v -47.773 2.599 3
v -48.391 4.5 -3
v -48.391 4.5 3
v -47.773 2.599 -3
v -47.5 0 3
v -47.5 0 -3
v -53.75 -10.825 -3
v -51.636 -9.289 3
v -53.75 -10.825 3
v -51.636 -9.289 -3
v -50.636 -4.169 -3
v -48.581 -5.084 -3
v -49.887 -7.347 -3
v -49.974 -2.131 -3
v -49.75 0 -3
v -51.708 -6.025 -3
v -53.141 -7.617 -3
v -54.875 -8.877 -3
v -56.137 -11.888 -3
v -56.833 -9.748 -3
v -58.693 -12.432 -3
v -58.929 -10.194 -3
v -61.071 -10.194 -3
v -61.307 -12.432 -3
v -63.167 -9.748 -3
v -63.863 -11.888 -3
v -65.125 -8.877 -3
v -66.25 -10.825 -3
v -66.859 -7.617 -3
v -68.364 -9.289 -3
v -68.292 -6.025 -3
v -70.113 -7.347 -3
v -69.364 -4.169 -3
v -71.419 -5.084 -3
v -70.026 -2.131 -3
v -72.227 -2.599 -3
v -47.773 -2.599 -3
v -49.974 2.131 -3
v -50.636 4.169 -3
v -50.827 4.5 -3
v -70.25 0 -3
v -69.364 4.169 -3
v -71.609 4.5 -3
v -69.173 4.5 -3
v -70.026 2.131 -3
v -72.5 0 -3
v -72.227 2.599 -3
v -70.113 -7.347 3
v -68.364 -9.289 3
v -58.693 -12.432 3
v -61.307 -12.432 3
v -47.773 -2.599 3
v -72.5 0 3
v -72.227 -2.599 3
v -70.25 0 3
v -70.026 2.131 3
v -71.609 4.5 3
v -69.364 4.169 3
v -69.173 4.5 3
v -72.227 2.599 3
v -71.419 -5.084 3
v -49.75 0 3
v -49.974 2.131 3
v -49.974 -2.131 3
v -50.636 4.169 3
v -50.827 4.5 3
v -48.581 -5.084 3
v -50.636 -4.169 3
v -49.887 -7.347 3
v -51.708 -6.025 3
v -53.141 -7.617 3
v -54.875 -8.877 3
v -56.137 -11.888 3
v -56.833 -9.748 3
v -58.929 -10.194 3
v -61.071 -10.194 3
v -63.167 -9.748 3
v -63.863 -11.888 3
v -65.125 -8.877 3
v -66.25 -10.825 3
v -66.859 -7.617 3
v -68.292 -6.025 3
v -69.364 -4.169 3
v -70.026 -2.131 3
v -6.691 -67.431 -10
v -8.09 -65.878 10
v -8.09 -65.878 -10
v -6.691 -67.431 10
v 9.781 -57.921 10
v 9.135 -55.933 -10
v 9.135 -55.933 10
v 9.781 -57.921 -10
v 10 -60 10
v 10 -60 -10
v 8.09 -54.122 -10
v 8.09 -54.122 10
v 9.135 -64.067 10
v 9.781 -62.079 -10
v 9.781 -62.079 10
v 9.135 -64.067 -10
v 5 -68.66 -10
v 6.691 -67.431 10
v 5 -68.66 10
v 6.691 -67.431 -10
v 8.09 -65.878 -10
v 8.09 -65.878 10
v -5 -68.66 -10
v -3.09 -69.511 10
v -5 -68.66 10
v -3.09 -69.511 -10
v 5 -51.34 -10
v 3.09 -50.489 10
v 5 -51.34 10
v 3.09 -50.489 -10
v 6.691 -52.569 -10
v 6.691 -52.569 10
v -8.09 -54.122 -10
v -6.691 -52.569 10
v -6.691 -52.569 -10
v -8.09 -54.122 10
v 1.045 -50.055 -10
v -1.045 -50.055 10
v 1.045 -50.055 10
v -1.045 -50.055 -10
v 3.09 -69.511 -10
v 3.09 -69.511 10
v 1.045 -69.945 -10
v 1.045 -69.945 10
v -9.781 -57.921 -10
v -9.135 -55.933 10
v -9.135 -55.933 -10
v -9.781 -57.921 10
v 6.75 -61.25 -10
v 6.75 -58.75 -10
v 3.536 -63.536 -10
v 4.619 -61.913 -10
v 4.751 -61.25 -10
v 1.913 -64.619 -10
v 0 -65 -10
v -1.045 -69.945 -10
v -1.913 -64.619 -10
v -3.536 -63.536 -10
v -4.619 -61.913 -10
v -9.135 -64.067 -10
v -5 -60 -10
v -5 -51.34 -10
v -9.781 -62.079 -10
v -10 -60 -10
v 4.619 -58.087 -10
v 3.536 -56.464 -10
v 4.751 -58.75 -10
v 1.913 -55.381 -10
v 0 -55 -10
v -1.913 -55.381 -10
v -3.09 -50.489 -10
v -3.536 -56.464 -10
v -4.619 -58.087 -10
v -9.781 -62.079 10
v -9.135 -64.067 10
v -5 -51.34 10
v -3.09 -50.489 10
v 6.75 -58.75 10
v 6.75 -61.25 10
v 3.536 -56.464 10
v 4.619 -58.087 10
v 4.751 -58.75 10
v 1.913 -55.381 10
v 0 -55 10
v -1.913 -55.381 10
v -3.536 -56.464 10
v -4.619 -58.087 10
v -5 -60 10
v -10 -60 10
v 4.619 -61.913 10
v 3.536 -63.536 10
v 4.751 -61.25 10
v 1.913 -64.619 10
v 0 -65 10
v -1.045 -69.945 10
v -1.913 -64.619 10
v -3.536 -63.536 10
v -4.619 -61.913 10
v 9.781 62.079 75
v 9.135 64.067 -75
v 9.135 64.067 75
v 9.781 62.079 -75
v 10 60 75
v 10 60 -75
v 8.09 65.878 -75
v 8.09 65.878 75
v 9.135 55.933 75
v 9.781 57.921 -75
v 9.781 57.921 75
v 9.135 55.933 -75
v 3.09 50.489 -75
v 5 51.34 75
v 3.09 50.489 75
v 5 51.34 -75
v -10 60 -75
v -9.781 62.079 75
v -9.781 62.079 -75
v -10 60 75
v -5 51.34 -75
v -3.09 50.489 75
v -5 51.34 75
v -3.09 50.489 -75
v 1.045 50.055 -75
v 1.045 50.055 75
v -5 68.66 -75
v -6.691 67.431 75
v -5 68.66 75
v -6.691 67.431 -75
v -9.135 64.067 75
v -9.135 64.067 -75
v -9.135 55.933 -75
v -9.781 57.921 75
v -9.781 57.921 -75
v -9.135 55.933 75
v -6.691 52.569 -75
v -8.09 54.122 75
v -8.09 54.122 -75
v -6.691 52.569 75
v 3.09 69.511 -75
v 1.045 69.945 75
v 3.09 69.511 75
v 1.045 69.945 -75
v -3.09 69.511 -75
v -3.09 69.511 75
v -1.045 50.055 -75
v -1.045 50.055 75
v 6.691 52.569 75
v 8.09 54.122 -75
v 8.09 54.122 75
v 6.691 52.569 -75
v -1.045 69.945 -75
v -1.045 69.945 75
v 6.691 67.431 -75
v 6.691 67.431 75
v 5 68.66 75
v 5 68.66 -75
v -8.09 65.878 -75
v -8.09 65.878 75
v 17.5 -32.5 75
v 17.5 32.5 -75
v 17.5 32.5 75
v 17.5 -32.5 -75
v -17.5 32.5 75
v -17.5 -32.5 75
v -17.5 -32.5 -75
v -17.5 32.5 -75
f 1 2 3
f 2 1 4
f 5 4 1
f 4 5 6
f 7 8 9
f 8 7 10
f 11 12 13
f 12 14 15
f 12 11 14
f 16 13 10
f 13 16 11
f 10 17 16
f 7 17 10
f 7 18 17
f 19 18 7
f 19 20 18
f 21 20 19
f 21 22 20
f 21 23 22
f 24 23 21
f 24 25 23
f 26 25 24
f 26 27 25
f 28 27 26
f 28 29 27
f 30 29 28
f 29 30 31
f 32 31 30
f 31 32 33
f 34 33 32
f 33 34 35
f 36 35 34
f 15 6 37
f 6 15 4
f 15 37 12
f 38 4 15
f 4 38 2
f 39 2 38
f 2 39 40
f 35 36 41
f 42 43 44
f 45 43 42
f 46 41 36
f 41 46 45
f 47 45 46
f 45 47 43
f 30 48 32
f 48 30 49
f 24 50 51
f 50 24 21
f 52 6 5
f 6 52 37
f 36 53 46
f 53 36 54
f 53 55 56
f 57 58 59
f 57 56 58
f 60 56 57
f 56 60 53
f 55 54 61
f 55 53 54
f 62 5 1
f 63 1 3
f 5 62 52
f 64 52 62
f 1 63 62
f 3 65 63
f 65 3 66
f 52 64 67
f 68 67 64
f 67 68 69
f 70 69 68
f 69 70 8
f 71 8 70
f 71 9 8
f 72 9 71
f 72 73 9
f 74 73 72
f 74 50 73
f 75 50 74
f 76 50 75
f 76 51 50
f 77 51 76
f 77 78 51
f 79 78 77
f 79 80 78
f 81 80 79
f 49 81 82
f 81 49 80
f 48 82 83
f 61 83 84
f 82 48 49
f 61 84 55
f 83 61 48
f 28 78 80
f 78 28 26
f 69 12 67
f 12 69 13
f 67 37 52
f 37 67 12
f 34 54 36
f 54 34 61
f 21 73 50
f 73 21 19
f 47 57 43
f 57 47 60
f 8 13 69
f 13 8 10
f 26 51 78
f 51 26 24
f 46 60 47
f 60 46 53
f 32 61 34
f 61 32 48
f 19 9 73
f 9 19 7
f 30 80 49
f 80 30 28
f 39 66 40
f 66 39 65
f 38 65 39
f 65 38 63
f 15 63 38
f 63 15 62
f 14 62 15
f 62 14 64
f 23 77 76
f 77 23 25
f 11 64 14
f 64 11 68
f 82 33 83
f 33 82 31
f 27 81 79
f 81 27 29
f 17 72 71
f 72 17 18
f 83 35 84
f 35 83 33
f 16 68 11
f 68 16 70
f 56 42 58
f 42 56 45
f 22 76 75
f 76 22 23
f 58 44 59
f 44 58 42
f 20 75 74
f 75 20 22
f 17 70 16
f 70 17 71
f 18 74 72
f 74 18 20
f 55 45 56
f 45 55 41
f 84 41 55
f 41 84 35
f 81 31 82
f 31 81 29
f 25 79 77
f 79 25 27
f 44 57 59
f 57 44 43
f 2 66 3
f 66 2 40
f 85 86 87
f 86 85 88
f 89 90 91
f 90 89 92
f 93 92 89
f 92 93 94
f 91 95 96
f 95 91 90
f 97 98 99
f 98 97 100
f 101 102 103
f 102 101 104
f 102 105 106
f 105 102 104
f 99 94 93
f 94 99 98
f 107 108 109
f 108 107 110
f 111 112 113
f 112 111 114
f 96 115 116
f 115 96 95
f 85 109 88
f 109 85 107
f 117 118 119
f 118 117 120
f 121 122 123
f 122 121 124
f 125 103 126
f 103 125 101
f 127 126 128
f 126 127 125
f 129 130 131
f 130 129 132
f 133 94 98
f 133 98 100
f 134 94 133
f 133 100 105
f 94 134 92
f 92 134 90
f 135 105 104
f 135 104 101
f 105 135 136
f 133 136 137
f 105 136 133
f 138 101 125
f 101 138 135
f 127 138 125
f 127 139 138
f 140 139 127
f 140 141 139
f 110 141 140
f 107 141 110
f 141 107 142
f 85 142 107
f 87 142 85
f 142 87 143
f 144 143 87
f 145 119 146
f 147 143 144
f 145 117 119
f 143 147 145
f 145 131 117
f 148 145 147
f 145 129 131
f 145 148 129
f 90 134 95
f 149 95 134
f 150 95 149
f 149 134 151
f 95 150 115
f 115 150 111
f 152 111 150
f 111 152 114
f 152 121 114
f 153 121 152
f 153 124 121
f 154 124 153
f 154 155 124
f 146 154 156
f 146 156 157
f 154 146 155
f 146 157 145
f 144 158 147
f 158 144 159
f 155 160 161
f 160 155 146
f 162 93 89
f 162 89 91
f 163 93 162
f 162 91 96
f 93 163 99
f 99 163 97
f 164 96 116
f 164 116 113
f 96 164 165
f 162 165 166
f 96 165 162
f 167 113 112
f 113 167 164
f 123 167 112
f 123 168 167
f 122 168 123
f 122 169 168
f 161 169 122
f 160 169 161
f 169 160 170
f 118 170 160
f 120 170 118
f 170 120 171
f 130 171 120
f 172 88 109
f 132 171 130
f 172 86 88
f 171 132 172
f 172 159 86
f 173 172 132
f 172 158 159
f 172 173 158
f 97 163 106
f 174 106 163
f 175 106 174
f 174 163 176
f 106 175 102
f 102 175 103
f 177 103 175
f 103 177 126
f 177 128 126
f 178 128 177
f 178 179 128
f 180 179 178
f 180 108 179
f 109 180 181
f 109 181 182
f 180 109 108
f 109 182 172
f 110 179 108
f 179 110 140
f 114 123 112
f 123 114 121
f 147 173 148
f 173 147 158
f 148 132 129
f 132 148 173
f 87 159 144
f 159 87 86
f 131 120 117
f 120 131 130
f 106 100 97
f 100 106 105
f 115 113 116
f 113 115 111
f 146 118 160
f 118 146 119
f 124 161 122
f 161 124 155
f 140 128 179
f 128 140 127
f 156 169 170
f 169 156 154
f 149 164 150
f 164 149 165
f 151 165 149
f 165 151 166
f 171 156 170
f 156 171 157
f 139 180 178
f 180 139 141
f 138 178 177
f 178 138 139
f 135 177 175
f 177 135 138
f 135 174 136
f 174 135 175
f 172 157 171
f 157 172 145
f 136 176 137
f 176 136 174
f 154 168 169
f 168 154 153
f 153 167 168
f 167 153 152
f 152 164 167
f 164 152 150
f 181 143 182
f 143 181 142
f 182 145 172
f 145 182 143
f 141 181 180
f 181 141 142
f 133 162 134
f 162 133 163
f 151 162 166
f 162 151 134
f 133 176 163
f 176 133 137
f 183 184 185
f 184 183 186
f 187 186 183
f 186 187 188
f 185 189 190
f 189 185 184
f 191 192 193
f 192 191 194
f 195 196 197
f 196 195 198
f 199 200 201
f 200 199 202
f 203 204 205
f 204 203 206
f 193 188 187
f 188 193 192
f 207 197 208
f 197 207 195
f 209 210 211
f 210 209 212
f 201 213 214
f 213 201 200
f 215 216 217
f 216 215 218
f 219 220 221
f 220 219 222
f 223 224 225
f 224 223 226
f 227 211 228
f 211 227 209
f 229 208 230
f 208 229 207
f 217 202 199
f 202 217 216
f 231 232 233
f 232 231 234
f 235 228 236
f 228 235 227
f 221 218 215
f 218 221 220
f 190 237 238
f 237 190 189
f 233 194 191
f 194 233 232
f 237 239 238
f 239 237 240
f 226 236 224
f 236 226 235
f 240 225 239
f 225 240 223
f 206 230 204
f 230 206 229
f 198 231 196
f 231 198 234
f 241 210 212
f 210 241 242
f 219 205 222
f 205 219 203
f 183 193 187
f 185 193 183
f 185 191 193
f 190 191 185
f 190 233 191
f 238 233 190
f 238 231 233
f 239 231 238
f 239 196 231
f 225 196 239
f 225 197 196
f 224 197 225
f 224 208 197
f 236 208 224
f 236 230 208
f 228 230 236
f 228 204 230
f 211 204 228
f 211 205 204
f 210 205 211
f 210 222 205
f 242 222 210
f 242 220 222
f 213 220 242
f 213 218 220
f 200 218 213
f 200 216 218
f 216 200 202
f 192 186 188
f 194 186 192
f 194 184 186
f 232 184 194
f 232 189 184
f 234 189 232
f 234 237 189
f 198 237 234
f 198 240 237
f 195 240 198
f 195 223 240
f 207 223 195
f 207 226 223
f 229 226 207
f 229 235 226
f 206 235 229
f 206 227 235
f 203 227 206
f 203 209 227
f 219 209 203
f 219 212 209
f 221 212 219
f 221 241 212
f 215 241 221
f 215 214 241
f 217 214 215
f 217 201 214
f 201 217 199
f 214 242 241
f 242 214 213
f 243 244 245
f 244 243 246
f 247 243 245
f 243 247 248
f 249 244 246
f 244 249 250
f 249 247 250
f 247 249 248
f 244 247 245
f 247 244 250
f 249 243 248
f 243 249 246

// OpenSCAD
//$fa=0.01;
//$fs=0.5;

module tascam() {
	dimensions = [35,65,150];
	cube(dimensions,center=true);
}

module nt6amp() {
	cylinder(r=10, h=150, center=true);
}

module sheath() {
	difference() {
		cylinder(r=10, h=20, center=true);
		cylinder(r=5, h=25, center=true);
		translate([4.5,0,0])
		cube([4.5,2.5,40],center=true);
	}
}

module clip() {
	difference() {
		cylinder(r=12.5, h=6, center=true);
		cylinder(r=10.25, h=15, center=true);
		translate([0,11,0])
		cube([27,13,7],center=true);	
	}
}

translate([-60,0,0])
clip();

translate([0,-60,0])
color("blue")
sheath();

translate([0,60,0])
nt6amp();

color("darkgray")
tascam();
